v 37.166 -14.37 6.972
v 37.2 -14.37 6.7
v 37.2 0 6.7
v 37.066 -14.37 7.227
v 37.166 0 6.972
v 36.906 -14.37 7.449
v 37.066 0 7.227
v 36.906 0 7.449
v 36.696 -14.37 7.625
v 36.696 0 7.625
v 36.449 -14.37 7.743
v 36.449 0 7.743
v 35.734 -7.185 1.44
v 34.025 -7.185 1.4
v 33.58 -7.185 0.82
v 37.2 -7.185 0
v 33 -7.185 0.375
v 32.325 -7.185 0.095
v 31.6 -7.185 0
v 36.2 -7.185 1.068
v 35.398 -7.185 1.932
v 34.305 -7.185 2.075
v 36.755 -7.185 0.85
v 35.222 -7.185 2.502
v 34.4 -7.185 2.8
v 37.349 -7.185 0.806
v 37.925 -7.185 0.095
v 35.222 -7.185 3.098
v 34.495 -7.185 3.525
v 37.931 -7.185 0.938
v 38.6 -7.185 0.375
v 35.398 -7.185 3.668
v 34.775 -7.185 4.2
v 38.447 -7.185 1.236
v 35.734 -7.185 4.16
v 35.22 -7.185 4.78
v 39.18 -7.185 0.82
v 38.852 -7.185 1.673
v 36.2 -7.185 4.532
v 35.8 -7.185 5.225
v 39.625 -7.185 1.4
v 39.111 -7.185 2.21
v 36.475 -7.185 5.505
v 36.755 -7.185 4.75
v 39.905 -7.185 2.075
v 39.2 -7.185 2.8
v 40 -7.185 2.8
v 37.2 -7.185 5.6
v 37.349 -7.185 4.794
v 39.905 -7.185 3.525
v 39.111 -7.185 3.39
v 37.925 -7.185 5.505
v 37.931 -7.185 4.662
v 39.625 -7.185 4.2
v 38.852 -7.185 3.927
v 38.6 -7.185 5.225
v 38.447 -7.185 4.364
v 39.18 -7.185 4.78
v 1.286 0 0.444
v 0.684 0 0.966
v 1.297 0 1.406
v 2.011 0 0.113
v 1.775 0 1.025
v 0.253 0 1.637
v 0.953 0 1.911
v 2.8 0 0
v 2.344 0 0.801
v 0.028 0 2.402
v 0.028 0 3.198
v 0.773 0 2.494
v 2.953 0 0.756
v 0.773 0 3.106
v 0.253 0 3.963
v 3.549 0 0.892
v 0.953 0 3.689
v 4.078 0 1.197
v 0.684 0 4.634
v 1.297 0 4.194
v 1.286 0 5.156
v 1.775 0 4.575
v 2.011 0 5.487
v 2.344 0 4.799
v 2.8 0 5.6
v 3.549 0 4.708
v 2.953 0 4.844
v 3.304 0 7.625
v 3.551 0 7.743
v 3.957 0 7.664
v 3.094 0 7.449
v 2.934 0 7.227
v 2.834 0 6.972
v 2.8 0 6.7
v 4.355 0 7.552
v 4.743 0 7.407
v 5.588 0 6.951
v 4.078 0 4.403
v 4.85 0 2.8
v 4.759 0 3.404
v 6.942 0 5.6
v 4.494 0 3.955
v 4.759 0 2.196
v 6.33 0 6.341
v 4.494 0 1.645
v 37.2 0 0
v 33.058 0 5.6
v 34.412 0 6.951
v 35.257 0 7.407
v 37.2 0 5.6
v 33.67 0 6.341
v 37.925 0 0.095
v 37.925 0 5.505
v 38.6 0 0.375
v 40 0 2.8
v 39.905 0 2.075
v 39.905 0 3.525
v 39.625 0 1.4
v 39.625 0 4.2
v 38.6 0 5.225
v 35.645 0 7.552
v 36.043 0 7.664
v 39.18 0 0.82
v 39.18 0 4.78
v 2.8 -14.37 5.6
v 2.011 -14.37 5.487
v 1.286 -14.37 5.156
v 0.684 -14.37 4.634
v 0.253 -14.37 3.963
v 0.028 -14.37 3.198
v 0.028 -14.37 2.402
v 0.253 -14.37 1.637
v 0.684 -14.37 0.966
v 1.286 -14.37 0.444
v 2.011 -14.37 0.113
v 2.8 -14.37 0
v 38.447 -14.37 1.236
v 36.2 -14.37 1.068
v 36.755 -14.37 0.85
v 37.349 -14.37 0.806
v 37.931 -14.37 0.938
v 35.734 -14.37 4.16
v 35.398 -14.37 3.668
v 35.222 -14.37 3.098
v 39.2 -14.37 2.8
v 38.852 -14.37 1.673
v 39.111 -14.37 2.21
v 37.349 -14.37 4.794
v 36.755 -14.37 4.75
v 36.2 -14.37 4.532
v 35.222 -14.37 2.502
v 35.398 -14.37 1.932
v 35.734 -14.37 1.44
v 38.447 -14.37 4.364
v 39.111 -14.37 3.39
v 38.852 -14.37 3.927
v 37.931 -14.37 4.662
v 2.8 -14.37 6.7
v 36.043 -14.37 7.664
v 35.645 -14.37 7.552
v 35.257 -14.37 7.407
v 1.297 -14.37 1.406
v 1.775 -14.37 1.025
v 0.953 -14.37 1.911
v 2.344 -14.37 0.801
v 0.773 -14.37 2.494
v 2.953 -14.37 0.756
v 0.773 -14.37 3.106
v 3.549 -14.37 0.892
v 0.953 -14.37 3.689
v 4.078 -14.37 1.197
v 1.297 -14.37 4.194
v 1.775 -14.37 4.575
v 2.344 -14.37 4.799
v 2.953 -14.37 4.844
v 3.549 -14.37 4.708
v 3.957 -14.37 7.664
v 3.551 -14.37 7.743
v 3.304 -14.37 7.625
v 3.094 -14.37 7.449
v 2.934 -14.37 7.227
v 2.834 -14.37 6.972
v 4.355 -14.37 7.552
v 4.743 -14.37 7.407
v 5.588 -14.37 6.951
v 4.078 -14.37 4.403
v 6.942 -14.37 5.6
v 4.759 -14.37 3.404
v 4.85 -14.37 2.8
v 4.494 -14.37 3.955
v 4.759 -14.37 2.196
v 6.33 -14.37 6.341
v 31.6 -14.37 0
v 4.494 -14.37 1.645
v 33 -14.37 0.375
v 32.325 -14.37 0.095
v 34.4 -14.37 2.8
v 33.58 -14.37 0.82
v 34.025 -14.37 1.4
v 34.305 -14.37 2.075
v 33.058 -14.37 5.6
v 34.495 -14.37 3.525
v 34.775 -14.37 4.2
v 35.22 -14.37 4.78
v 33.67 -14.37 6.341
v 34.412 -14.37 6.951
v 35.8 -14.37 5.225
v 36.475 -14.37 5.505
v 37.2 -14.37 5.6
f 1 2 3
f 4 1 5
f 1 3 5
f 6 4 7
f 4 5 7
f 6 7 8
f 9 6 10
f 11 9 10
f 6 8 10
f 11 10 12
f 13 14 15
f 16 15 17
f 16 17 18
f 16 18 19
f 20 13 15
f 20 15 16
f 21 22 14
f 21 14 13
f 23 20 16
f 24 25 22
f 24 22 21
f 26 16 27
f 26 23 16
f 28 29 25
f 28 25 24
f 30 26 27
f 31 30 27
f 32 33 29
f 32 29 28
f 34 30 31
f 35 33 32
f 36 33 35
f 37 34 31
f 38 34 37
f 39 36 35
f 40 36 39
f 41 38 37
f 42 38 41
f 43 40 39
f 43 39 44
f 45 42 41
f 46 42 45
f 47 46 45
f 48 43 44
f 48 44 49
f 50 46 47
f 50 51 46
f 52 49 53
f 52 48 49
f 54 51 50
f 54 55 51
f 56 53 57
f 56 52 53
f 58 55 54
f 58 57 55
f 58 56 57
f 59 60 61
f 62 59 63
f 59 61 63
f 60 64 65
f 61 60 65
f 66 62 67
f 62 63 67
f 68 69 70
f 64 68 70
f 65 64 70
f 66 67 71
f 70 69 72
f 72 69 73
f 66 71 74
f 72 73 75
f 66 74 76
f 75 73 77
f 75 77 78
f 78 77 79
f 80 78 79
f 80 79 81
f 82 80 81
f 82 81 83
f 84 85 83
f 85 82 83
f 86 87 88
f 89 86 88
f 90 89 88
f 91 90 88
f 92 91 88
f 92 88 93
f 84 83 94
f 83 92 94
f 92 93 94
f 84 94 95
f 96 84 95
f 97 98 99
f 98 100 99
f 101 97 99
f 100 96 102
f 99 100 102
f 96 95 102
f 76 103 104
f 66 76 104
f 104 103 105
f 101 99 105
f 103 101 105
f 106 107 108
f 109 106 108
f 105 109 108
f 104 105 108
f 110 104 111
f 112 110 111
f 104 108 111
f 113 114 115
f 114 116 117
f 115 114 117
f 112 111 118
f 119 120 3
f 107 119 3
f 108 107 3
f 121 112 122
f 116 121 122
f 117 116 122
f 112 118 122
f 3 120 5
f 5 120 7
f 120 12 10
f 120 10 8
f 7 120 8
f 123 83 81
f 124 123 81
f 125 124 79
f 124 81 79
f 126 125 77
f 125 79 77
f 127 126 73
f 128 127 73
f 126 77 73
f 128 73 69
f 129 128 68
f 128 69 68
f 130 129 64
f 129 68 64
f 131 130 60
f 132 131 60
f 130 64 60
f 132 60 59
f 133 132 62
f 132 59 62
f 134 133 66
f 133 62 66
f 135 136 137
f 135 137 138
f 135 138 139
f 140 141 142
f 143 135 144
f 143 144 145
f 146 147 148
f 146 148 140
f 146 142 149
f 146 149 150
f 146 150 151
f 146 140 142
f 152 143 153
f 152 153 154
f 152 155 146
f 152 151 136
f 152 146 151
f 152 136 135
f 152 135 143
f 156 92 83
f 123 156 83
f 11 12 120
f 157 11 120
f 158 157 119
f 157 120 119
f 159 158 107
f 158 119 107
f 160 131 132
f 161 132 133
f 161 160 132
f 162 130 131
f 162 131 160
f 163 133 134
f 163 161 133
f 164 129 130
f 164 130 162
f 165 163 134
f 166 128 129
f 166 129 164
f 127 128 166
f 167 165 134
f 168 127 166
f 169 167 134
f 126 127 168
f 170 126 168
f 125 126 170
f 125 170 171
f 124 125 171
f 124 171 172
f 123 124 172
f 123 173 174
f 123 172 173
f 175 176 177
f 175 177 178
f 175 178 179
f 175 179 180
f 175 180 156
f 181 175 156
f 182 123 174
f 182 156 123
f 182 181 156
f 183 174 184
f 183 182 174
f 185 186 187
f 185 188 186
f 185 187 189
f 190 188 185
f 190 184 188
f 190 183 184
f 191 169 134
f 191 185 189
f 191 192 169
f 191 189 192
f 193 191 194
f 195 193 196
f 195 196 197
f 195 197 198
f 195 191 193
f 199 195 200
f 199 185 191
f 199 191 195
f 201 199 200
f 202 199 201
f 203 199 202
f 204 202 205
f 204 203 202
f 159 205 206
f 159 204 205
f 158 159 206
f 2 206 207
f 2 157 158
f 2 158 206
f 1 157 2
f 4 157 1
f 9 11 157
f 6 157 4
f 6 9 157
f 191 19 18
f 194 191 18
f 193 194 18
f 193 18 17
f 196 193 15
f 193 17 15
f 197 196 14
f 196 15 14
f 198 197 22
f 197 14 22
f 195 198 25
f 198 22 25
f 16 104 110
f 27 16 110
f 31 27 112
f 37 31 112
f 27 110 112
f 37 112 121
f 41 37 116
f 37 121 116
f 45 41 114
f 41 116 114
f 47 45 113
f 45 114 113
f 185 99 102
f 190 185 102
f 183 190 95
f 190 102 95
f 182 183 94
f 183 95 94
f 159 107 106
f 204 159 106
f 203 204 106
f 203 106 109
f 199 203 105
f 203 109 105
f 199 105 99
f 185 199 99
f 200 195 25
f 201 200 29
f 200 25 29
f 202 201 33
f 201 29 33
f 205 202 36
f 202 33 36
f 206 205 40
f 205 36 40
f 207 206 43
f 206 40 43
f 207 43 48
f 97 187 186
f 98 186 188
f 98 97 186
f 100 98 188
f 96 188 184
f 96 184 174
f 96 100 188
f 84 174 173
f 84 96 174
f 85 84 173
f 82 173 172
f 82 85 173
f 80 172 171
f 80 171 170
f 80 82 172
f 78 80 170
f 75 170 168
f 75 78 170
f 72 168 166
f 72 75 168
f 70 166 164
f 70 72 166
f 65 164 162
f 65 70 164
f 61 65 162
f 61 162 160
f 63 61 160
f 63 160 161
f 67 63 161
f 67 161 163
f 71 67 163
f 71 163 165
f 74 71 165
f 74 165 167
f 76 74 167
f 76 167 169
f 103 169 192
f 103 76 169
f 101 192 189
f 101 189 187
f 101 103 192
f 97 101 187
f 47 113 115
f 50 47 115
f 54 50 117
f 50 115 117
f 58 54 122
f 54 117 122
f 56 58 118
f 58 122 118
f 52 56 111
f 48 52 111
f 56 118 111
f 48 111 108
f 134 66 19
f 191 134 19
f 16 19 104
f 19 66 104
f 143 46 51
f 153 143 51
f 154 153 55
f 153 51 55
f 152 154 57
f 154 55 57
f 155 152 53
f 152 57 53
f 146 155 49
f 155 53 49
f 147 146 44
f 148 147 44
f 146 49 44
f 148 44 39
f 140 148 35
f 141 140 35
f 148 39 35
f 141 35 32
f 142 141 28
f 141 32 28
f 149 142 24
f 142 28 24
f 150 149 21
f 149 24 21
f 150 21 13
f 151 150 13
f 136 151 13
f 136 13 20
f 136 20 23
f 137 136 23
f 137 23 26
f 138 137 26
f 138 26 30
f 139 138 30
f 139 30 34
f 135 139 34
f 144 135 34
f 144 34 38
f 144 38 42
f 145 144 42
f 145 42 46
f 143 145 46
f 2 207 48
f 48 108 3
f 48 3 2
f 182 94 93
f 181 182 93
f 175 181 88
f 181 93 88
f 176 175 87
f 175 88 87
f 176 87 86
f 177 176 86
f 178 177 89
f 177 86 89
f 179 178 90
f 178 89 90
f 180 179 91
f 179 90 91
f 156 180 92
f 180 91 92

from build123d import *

# Parameters (mm, degrees)
F0_R     = 2
F1_DEPTH = 14.37
F2_DEPTH = 14.37
F3_DEPTH = 7.185
F0_R_2   = 2.05
F4_DEPTH = 14.37


# Not quite as in the source:
# - a feature names something its author has since deleted; it is built from what else it names


with BuildPart() as f1:
    # F0 (on Front) → F1 (new body)
    with BuildSketch(Plane.XZ):
        with Locations((37.2, 2.8)):
            Circle(F0_R)
    extrude(amount=F1_DEPTH)



with BuildPart() as f2:
    # F0 (on Front) → F2 (new body)
    with BuildSketch(Plane.XZ):
        with BuildLine():
            ThreePointArc((5.6, 2.8), (6.4201010127, 0.8201010127), (8.4, 0))
            Line((8.4, 0), (31.6, 0))
            ThreePointArc((31.6, 0), (33.5798989873, 0.8201010127), (34.4, 2.8))
            ThreePointArc((34.4, 2.8), (35.2201010127, 4.7798989873), (37.2, 5.6))
            Line((37.2, 5.6), (37.2, 6.7))
            ThreePointArc((37.2, 6.7), (36.9926506427, 7.3427867688), (36.4487730361, 7.7432436768))
            ThreePointArc((36.4487730361, 7.7432436768), (35.8426991749, 7.6122483799), (35.2574998019, 7.4072435339))
            ThreePointArc((35.2574998019, 7.4072435339), (35.103012566, 6.2352247249), (36.1, 5.6))
            Line((36.1, 5.6), (33.0575369646, 5.6))
            Line((33.0575369646, 5.6), (6.9424630354, 5.6))
            Line((6.9424630354, 5.6), (3.9, 5.6))
            ThreePointArc((3.9, 5.6), (4.896987434, 6.2352247249), (4.7425001981, 7.4072435339))
            ThreePointArc((4.7425001981, 7.4072435339), (4.1573008251, 7.6122483799), (3.5512269639, 7.7432436768))
            ThreePointArc((3.5512269639, 7.7432436768), (3.0073493573, 7.3427867688), (2.8, 6.7))
            Line((2.8, 6.7), (2.8, 5.6))
            ThreePointArc((2.8, 5.6), (4.7798989873, 4.7798989873), (5.6, 2.8))
        make_face()
        with BuildLine():
            ThreePointArc((35.2574998019, 7.4072435339), (34.0261653027, 6.6635182559), (33.0575369646, 5.6))
            Line((33.0575369646, 5.6), (36.1, 5.6))
            ThreePointArc((36.1, 5.6), (35.103012566, 6.2352247249), (35.2574998019, 7.4072435339))
        make_face()
        with BuildLine():
            ThreePointArc((6.9424630354, 5.6), (5.9738346973, 6.6635182559), (4.7425001981, 7.4072435339))
            ThreePointArc((4.7425001981, 7.4072435339), (4.896987434, 6.2352247249), (3.9, 5.6))
            Line((3.9, 5.6), (6.9424630354, 5.6))
        make_face()
    extrude(amount=F2_DEPTH)


with BuildPart() as f1_1:
    add(f1.part)

    add(f2.part)  # F3 merges F2
    # F0 (on Front) → F3 (join)
    with BuildSketch(Plane.XZ):
        with BuildLine():
            ThreePointArc((34.4, 2.8), (35.2201010127, 0.8201010127), (37.2, 0))
            ThreePointArc((37.2, 0), (39.1798989873, 0.8201010127), (40, 2.8))
            ThreePointArc((40, 2.8), (39.1798989873, 4.7798989873), (37.2, 5.6))
            ThreePointArc((37.2, 5.6), (35.2201010127, 4.7798989873), (34.4, 2.8))
        make_face()
        with Locations((37.2, 2.8)):
            Circle(F0_R, mode=Mode.SUBTRACT)
        with BuildLine():
            ThreePointArc((34.4, 2.8), (33.5798989873, 0.8201010127), (31.6, 0))
            Line((31.6, 0), (37.2, 0))
            ThreePointArc((37.2, 0), (35.2201010127, 0.8201010127), (34.4, 2.8))
        make_face()
    extrude(amount=F3_DEPTH)

    # F0 (on Front) → F4 (join)
    with BuildSketch(Plane.XZ):
        with BuildLine():
            ThreePointArc((5.6, 2.8), (4.7798989873, 0.8201010127), (2.8, 0))
            Line((2.8, 0), (8.4, 0))
            ThreePointArc((8.4, 0), (6.4201010127, 0.8201010127), (5.6, 2.8))
        make_face()
        with BuildLine():
            ThreePointArc((2.8, 5.6), (0, 2.8), (2.8, 0))
            ThreePointArc((2.8, 0), (4.7798989873, 0.8201010127), (5.6, 2.8))
            ThreePointArc((5.6, 2.8), (4.7798989873, 4.7798989873), (2.8, 5.6))
        make_face()
        with Locations((2.8, 2.8)):
            Circle(F0_R_2, mode=Mode.SUBTRACT)
    extrude(amount=F4_DEPTH)


solid = f1_1.part
